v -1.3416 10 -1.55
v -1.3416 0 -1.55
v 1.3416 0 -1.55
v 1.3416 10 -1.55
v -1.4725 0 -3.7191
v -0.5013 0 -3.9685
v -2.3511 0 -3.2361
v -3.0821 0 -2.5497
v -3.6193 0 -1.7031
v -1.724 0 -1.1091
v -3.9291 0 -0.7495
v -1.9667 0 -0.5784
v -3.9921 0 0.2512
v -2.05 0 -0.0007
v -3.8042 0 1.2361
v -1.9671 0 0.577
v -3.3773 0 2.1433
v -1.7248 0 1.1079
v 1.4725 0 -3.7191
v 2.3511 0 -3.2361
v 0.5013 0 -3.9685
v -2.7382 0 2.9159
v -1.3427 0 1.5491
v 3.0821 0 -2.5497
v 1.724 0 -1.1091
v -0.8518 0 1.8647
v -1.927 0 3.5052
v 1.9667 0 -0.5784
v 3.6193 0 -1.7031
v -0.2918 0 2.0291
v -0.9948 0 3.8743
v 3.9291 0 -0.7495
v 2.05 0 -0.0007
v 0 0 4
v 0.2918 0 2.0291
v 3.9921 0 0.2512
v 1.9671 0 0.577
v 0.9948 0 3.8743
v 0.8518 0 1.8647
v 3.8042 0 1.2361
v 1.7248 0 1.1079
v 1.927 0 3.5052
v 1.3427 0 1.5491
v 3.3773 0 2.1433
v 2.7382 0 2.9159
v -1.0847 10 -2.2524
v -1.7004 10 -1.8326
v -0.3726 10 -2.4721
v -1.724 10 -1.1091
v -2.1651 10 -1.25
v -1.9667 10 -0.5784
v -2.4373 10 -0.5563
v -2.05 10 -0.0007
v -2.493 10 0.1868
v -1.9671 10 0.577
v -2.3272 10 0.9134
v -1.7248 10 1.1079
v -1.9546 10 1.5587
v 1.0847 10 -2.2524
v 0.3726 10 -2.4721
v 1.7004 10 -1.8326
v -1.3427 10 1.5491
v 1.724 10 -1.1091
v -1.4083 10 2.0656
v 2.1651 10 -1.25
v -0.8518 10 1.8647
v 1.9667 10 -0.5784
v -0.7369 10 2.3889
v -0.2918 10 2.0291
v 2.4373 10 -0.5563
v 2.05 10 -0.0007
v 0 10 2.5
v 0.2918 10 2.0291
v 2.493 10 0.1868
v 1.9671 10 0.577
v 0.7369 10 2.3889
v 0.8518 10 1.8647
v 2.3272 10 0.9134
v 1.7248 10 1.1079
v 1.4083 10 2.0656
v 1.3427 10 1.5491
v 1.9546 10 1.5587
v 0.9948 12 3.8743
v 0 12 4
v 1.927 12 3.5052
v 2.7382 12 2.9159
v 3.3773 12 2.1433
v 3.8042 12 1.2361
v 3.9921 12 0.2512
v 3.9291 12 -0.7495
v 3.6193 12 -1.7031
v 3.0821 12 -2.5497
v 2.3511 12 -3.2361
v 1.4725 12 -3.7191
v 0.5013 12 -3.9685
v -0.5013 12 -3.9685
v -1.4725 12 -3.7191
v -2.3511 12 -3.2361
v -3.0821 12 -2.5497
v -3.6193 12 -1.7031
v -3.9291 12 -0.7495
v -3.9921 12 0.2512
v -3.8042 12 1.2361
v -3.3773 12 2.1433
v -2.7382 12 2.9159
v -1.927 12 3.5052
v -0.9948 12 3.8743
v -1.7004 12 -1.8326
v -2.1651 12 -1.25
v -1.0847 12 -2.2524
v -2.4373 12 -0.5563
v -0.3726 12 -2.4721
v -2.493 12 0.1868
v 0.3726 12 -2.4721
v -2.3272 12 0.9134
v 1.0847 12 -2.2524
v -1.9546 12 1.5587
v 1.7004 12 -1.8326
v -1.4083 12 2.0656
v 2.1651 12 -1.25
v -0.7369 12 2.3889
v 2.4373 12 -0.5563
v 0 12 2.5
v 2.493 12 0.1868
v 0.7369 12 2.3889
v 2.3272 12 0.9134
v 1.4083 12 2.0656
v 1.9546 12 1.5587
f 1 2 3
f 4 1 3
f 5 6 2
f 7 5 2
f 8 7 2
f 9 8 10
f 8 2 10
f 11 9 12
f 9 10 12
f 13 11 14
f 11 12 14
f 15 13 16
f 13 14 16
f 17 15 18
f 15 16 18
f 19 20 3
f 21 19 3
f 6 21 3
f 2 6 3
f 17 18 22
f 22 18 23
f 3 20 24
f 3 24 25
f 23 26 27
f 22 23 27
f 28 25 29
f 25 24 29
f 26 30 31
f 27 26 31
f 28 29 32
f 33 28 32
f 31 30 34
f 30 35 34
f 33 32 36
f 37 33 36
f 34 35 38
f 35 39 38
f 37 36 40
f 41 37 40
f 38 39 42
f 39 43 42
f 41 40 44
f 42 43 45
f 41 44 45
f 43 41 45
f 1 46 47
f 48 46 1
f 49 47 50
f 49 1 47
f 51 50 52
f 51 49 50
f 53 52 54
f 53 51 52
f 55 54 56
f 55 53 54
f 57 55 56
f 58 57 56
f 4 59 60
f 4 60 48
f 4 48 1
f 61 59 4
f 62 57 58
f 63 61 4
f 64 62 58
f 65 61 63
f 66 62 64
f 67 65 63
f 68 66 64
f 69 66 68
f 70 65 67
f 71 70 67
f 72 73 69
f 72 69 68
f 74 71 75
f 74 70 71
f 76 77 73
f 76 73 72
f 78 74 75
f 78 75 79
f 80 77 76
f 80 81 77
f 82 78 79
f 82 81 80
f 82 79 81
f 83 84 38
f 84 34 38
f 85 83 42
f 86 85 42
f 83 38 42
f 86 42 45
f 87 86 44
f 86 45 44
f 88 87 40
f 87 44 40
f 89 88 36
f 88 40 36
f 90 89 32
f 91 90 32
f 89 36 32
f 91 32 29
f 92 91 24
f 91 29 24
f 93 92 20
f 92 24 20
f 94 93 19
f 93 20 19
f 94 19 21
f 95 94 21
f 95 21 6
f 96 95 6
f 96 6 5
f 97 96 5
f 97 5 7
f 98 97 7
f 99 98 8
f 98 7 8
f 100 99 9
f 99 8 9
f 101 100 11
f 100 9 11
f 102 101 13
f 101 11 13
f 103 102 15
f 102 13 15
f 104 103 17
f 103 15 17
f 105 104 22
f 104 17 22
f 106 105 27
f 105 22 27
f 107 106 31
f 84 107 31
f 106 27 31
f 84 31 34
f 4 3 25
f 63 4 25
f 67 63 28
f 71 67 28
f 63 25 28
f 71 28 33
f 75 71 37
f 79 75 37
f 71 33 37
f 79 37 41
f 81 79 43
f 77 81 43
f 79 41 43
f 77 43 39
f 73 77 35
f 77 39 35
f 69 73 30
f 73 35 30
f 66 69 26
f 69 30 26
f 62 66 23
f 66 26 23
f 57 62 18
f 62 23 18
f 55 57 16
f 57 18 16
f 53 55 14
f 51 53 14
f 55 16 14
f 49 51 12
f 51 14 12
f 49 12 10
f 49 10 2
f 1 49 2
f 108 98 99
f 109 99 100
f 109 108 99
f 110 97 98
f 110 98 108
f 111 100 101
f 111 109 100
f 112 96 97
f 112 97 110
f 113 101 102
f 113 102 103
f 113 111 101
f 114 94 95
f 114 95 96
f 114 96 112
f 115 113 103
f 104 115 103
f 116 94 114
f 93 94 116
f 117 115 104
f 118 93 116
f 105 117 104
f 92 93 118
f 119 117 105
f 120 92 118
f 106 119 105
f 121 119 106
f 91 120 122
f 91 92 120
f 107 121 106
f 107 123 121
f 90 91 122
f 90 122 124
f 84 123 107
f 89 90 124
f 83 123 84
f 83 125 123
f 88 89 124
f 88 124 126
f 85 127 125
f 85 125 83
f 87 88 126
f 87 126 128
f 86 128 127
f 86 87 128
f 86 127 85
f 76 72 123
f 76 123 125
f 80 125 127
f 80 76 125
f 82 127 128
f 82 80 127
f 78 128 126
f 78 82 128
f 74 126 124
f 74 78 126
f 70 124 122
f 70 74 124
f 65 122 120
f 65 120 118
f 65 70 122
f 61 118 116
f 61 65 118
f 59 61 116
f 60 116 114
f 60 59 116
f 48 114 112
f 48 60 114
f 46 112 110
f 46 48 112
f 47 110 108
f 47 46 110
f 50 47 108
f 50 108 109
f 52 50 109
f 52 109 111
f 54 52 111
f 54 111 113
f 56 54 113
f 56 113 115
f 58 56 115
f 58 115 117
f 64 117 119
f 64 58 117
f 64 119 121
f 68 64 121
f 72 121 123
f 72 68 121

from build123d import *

# Parameters (mm, degrees)
SKETCH1_R           = 4
BOSS_EXTRUDE1_DEPTH = 10
SKETCH2_R           = 4
SKETCH2_R_2         = 2.5
BOSS_EXTRUDE2_DEPTH = 2


with BuildPart() as part:
    # Sketch1 → Boss-Extrude1 (new body)
    with BuildSketch(Plane(origin=(0, 0, 0), x_dir=(1, 0, 0), z_dir=(0, 1, 0))):
        with Locations(Location((0, 0, 0), (0, 0, 270))):
            Circle(SKETCH1_R)
        with BuildLine():
            Line((-1.341640786, 1.55), (1.341640786, 1.55))
            ThreePointArc((1.341640786, 1.55), (0, -2.05), (-1.341640786, 1.55))
        make_face(mode=Mode.SUBTRACT)
    extrude(amount=BOSS_EXTRUDE1_DEPTH)

    # Sketch2 → Boss-Extrude2 (add)
    with BuildSketch(Plane(origin=(0, 10, 0), x_dir=(1, 0, 0), z_dir=(0, 1, 0))):
        with Locations(Location((0, 0, 0), (0, 0, 270))):
            Circle(SKETCH2_R)
        with Locations(Location((0, 0, 0), (0, 0, 270))):
            Circle(SKETCH2_R_2, mode=Mode.SUBTRACT)
    extrude(amount=BOSS_EXTRUDE2_DEPTH)


solid = part.part
